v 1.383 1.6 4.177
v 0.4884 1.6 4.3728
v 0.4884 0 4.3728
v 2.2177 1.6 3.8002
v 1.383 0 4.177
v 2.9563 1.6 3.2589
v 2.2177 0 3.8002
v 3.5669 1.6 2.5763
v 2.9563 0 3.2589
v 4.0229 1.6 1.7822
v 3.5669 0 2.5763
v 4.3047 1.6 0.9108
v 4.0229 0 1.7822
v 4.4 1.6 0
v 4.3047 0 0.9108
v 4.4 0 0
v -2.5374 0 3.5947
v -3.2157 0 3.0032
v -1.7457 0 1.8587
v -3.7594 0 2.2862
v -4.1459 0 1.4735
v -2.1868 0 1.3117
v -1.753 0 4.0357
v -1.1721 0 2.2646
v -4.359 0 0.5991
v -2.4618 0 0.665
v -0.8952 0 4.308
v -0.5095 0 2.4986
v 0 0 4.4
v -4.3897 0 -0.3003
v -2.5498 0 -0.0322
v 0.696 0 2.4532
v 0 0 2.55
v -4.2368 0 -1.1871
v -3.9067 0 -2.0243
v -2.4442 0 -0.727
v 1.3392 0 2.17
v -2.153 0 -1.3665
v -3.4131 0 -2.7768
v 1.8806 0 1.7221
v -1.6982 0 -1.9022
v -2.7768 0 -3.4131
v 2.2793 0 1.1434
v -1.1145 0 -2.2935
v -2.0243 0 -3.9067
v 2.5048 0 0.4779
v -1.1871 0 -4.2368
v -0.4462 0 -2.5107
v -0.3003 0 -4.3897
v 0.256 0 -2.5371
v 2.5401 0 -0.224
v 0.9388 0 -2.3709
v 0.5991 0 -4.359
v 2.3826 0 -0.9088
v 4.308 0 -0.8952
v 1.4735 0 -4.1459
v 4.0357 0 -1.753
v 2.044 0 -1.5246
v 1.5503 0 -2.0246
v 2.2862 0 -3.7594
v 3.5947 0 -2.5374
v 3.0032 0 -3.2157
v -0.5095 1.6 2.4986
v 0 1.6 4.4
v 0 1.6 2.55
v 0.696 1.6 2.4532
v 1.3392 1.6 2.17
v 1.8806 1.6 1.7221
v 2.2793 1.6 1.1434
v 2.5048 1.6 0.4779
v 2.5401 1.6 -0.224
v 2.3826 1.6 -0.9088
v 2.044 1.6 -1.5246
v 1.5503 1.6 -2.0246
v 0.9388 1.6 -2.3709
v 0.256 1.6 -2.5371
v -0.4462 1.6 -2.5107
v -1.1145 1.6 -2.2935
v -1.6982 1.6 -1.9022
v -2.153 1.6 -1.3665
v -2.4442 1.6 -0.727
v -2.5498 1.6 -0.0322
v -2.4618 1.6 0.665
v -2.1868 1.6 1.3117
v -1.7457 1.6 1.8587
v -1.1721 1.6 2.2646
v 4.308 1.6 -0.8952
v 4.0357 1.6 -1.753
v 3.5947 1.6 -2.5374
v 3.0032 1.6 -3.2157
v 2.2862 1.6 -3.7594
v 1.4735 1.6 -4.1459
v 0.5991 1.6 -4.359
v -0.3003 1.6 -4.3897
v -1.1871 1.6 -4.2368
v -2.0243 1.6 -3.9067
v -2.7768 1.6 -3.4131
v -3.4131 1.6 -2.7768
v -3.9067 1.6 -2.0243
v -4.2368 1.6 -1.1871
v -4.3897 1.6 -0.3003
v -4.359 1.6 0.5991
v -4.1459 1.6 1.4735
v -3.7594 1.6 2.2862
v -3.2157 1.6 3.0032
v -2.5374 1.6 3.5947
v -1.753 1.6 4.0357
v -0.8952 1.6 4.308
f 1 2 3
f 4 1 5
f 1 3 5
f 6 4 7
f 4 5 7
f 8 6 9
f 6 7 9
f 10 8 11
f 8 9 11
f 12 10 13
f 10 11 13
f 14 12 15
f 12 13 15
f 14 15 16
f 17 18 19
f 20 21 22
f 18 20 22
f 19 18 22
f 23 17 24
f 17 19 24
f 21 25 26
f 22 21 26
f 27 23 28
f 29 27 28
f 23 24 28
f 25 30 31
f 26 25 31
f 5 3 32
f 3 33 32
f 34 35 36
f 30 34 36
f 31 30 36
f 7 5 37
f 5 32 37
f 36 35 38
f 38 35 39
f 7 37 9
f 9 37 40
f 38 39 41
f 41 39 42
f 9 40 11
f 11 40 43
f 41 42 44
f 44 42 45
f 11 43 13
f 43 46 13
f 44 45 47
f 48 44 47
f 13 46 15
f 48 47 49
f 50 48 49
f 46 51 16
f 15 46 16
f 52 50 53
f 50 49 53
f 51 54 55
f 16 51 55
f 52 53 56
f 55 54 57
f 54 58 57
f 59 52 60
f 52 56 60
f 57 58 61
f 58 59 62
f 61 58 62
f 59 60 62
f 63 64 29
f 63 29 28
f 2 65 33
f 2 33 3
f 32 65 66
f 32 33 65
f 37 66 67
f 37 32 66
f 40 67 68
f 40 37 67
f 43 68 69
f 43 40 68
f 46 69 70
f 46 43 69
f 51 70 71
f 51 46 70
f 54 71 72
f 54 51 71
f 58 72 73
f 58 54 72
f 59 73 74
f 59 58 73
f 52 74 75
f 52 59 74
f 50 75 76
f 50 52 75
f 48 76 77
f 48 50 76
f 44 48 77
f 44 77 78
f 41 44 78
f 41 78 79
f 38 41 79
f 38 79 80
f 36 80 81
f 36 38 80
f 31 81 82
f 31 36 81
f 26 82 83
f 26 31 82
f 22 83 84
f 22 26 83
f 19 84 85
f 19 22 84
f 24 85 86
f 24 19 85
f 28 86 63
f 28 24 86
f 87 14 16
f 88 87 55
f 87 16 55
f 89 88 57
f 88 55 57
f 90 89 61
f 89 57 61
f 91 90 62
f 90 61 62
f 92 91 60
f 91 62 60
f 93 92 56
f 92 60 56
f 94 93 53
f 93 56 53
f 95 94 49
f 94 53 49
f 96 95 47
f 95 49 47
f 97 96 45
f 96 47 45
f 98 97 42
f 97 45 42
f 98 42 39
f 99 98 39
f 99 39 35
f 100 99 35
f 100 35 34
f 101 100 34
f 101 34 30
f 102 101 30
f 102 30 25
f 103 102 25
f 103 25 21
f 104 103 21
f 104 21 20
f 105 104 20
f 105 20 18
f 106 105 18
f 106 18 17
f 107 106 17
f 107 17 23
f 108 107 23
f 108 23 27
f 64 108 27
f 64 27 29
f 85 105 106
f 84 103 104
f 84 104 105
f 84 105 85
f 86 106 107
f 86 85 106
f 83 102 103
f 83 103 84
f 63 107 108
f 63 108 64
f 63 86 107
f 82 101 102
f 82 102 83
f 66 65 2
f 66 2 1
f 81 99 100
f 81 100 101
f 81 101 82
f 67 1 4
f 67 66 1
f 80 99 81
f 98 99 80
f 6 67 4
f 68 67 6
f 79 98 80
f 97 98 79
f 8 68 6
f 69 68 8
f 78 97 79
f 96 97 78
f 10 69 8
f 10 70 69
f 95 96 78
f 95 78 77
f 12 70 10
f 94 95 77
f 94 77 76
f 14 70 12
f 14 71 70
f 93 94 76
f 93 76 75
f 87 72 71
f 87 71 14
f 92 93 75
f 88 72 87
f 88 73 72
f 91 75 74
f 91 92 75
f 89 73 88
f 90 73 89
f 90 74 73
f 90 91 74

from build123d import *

# Parameters (mm, degrees)
SKETCH_1_R               = 4.4
SKETCH_1_R_2             = 2.55
EXTRUDE_1_DEPTH          = 1.6
CUT_EXTRUDE_1_DEPTH      = 1
CUT_EXTRUDE_1_DEPTH_BACK = 2.6


with BuildPart() as part:
    # Эскиз1 → Бобышка-Вытянуть1 (new body)
    with BuildSketch(Plane(origin=(0, 0, 0), x_dir=(1, 0, 0), z_dir=(0, 1, 0))):
        Circle(SKETCH_1_R)
        Circle(SKETCH_1_R_2, mode=Mode.SUBTRACT)
    extrude(amount=EXTRUDE_1_DEPTH)

    # Эскиз2 → Вырез-Вытянуть1 (cut, two sides)
    with BuildSketch(Plane(origin=(0, 1.6, 0), x_dir=(1, 0, 0), z_dir=(0, 1, 0))) as cut_extrude_1_sk:
        with BuildLine():
            Line((0, -4.4), (-0.509482587, -2.498585098))
            ThreePointArc((-0.509482587, -2.498585098), (-0.256035153, -2.537113714), (0, -2.55))
            Line((0, -2.55), (0.488419817, -4.372807574))
            ThreePointArc((0.488419817, -4.372807574), (0.244588096, -4.393196634), (0, -4.4))
        make_face()
    extrude(amount=CUT_EXTRUDE_1_DEPTH, mode=Mode.SUBTRACT)
    extrude(cut_extrude_1_sk.sketch, amount=-CUT_EXTRUDE_1_DEPTH_BACK, mode=Mode.SUBTRACT)


solid = part.part
